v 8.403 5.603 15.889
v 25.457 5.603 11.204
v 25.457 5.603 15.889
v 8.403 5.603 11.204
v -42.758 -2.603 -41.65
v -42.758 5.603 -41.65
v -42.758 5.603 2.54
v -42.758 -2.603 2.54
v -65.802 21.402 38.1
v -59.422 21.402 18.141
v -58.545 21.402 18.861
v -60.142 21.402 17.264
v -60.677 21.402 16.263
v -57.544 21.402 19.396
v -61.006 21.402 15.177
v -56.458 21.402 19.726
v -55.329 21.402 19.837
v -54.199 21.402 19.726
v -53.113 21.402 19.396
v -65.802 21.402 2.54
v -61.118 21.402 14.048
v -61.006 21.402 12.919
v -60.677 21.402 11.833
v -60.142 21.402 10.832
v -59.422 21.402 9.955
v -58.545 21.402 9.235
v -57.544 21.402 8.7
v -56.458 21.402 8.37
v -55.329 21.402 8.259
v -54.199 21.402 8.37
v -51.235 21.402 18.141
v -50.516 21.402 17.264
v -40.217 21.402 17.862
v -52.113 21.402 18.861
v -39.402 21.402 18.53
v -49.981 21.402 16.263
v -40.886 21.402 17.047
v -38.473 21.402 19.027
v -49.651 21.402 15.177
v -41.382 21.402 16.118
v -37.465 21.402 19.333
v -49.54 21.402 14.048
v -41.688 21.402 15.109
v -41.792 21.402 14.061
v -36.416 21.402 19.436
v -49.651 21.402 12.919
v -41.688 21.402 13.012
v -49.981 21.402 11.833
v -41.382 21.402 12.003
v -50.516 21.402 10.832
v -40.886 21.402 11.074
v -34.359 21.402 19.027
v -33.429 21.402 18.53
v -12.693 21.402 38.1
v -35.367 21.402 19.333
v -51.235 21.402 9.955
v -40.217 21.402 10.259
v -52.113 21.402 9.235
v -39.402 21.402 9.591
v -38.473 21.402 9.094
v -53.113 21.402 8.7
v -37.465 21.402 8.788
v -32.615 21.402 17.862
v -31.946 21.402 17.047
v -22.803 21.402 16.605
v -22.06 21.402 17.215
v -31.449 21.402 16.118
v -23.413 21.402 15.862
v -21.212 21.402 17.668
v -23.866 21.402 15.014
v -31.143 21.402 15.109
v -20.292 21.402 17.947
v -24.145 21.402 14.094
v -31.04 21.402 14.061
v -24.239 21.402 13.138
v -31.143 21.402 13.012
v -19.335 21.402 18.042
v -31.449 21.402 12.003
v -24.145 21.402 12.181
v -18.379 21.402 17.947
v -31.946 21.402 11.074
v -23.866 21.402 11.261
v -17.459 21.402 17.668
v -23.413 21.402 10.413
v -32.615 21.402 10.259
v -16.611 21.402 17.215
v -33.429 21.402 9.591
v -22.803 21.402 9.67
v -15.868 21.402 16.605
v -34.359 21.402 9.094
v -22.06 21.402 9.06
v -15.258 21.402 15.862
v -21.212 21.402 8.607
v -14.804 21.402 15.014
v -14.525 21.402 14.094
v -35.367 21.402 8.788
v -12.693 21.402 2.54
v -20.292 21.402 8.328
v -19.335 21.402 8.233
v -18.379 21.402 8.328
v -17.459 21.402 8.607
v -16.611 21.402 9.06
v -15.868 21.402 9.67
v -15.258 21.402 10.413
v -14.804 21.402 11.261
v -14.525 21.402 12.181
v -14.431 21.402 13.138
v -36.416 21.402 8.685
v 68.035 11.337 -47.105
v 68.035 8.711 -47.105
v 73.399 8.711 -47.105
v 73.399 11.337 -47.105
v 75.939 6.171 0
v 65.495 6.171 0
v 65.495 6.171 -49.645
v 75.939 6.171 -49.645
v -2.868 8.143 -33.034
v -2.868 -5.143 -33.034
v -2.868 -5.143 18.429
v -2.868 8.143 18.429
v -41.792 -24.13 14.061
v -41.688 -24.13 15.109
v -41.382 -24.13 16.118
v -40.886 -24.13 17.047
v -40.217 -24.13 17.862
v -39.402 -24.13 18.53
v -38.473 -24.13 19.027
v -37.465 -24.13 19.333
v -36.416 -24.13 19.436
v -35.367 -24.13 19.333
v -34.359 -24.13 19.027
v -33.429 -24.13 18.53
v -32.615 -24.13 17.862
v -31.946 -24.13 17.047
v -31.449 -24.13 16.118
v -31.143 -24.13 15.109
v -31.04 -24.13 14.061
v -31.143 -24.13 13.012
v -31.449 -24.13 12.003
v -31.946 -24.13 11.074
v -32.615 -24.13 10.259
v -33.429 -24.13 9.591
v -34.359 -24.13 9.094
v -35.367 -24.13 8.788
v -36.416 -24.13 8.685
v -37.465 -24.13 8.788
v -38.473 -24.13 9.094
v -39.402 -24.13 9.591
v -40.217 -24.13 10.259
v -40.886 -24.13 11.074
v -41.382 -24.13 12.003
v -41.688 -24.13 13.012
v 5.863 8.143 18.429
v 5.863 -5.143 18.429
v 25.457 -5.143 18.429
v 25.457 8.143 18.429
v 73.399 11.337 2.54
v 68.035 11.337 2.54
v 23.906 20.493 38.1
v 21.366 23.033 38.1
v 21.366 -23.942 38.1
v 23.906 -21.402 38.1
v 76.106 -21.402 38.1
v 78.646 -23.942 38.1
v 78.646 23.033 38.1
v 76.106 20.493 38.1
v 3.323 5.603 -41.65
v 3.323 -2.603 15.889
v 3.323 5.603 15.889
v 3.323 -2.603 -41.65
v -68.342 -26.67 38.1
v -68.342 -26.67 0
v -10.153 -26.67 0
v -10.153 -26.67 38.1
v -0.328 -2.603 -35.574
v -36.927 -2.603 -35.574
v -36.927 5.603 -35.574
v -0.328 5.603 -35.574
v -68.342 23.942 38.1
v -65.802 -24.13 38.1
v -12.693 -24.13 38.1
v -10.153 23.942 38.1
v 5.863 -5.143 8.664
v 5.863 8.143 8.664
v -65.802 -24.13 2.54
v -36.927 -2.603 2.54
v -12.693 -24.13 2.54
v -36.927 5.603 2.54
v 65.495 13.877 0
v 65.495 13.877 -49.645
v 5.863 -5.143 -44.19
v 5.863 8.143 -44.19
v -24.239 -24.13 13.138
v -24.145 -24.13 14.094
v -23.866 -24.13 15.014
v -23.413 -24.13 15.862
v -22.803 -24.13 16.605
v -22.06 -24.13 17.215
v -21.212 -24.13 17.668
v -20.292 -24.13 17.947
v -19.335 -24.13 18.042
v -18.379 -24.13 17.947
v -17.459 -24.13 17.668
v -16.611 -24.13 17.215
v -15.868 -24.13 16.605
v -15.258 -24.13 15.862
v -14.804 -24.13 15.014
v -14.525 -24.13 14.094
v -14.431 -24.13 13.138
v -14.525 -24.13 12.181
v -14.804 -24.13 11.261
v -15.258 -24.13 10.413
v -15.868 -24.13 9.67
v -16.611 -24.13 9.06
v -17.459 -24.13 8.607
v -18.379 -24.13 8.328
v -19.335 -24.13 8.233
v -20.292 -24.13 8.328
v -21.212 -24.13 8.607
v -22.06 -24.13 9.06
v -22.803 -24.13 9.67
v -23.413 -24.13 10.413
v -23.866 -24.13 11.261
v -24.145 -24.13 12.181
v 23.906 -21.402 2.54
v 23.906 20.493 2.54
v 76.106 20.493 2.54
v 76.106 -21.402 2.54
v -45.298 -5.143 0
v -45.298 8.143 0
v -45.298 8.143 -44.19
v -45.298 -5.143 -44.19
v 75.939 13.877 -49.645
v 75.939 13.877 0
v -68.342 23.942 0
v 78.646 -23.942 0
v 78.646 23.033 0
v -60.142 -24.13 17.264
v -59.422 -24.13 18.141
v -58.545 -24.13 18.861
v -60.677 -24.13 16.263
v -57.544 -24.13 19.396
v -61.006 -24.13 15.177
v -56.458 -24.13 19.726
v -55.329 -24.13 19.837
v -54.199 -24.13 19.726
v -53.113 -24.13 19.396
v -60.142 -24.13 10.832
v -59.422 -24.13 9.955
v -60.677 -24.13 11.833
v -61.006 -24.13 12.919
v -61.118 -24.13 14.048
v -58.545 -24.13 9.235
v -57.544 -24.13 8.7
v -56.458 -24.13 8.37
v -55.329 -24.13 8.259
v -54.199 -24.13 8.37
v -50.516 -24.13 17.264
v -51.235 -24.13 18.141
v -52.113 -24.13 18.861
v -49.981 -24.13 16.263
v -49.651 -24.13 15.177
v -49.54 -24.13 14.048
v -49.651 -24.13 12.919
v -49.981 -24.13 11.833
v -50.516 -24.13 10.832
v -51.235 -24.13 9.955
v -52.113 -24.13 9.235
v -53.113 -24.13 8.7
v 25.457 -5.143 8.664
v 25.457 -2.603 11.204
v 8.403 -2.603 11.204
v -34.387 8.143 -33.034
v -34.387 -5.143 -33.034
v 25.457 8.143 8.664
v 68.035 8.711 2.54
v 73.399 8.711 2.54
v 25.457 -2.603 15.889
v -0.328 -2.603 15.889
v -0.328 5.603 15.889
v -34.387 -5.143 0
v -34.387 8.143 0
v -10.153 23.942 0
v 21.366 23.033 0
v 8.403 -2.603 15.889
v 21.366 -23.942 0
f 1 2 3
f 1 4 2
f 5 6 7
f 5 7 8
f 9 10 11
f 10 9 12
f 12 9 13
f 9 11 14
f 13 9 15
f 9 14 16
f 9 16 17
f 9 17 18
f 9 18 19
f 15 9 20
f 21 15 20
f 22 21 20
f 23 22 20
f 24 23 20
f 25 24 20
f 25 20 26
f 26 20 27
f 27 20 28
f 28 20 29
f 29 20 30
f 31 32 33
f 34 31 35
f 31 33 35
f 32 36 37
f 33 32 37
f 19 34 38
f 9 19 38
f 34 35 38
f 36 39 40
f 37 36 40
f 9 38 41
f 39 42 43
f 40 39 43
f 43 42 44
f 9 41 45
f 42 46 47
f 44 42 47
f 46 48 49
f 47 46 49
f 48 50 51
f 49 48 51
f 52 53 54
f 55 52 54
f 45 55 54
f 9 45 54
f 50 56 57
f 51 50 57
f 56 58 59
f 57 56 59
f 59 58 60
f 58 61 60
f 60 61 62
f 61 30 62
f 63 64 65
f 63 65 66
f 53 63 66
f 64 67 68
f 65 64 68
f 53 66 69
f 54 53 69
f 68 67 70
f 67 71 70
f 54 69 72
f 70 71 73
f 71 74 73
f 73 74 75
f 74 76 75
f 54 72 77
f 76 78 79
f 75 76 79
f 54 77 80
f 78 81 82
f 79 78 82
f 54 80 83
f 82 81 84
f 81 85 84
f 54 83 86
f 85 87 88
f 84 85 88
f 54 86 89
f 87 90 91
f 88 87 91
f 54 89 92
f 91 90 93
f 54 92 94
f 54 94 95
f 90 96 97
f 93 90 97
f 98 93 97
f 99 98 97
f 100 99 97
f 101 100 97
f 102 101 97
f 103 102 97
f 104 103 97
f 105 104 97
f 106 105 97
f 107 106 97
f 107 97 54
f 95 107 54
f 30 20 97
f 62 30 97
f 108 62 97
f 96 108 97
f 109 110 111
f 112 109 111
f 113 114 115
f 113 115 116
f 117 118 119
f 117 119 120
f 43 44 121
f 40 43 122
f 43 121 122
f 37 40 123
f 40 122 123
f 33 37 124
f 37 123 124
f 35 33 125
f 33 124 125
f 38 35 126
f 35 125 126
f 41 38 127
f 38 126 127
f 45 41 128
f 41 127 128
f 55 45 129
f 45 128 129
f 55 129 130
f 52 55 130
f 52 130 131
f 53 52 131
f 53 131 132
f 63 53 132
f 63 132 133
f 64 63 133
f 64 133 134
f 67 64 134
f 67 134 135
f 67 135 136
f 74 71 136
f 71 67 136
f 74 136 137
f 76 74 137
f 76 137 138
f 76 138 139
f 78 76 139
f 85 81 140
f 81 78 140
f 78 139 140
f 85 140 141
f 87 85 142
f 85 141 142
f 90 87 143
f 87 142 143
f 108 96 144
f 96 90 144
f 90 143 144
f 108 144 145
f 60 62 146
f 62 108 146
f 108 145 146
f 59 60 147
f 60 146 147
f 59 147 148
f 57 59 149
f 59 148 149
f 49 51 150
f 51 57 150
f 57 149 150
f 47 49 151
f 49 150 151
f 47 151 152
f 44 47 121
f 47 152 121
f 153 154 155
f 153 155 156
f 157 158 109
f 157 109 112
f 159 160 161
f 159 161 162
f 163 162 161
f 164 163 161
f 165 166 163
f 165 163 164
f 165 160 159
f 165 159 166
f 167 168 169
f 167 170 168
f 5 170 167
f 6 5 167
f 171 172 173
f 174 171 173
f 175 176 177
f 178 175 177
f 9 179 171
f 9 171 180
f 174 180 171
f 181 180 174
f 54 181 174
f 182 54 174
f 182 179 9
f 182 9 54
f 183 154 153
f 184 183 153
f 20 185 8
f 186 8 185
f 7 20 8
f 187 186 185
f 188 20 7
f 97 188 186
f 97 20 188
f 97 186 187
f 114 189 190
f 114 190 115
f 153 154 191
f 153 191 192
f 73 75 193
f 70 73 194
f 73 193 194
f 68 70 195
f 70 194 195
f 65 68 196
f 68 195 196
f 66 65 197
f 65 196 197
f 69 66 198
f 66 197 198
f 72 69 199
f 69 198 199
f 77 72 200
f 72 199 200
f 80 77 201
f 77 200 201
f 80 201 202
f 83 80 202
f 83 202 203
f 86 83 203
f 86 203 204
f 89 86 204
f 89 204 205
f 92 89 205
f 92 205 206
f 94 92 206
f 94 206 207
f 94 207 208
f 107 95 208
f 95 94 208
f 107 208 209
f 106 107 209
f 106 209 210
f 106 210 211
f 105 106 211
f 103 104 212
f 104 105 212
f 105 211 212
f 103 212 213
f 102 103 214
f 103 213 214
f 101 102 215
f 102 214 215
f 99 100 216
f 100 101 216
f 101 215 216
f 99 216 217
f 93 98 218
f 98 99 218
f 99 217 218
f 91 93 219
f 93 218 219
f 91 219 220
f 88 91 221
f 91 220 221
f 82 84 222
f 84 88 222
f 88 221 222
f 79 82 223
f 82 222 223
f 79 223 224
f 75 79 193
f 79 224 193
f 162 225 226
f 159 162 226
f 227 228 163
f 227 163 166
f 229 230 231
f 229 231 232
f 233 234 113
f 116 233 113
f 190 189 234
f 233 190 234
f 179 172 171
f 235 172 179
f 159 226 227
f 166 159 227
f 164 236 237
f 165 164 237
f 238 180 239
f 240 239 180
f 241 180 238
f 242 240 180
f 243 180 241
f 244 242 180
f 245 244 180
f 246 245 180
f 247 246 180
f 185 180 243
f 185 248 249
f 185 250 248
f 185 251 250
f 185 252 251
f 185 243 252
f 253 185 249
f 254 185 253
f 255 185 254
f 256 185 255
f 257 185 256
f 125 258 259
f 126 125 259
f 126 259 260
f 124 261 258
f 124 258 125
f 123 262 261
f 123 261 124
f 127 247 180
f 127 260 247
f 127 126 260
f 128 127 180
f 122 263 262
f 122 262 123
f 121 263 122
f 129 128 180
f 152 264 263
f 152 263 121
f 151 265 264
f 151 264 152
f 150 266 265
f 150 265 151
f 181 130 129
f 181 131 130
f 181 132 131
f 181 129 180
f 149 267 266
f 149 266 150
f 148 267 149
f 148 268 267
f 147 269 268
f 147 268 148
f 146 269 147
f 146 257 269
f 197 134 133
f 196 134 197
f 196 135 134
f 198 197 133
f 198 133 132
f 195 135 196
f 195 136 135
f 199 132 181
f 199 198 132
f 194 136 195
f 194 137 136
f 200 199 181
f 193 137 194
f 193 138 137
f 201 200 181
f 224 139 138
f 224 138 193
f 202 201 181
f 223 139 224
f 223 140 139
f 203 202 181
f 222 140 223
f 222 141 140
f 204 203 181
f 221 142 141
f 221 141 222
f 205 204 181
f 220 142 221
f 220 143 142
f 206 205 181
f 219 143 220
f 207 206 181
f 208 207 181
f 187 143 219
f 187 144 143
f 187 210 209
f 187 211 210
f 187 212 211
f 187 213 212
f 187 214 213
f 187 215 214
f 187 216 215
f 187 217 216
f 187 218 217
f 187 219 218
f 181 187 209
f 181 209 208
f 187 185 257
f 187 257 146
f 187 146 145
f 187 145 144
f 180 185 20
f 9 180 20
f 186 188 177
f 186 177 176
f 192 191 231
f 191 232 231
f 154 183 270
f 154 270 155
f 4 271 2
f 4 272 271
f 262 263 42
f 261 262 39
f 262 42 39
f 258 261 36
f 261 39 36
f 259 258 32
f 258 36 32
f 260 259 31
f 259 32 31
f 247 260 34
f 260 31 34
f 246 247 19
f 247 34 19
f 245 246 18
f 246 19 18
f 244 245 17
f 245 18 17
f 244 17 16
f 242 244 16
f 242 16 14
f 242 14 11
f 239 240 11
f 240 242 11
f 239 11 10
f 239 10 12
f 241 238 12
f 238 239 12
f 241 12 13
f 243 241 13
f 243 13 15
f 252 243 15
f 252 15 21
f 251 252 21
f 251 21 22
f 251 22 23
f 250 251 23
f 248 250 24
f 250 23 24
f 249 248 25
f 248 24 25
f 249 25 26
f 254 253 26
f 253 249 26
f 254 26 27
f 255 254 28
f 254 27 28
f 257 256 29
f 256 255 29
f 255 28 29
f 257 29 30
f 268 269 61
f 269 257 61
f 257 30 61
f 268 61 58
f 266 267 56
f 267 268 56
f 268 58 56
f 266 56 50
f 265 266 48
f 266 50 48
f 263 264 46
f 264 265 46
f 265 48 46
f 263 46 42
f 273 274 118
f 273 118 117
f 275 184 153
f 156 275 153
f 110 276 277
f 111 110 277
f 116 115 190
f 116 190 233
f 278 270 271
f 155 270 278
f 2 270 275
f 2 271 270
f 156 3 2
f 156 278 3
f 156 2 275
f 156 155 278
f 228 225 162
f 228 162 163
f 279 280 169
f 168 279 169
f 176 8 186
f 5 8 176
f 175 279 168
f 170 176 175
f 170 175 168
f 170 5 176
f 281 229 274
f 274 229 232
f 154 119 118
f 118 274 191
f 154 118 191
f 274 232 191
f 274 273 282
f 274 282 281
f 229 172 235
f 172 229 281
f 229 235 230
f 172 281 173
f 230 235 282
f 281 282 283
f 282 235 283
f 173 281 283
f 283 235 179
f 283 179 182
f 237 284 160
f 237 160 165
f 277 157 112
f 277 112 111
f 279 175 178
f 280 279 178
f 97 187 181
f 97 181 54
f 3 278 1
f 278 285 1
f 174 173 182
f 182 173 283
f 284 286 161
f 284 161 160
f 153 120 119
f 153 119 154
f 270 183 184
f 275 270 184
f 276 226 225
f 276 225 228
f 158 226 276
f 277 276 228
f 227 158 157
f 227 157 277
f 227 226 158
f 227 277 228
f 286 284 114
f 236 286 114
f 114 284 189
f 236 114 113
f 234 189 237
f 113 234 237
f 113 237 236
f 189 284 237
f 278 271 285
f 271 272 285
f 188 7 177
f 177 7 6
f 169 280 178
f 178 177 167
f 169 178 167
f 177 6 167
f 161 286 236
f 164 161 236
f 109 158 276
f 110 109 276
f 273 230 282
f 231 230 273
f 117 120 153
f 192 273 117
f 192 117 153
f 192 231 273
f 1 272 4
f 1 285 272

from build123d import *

# Parameters (mm, degrees)
F0_W      = 58.1890968606
F0_H      = 50.6123900414
F1_DEPTH  = 38.1
F2_W      = 57.2798922658
F2_H      = 46.9755697995
F3_DEPTH  = 38.1
F5_W      = 10.9104551375
F5_H      = 13.2867023349
F6_DEPTH  = 44.19023
F7_W      = 13.2867023349
F7_H      = 11.1557973206
F8_DEPTH  = 40.25034
F9_W      = 8.7312487776
F9_H      = 13.2867023349
F10_DEPTH = 51.46386
F12_W     = 10.4440525174
F12_H     = 7.7061494812
F13_DEPTH = 49.64546
F14_T     = -2.54
F15_T     = -2.54
F11_W     = 13.2867023349
F11_H     = 9.7652821862
F16_DEPTH = 19.59361
F17_T     = -2.54
F18_R     = 4.9041539646
F19_DEPTH = 46.8809679151
F20_R     = 5.3757066386
F21_DEPTH = 47.4310778081
F22_R     = 5.788816606
F23_DEPTH = 46.9942092896


with BuildPart() as f1:
    # F0 (on Top) → F1 (new body)
    with BuildSketch(Plane.XY):
        with Locations((-39.2473326065, -1.3638064265)):
            Rectangle(F0_W, F0_H)
    extrude(amount=F1_DEPTH)

    # F5 (on face) → F6 (join)
    with BuildSketch(Plane(origin=(0, 0, 0), x_dir=(1, 0, 0), z_dir=(0, 0, -1))):
        with Locations((-39.8426409811, -1.5001110733)):
            Rectangle(F5_W, F5_H)
    extrude(amount=F6_DEPTH)

    # F7 (on face) → F8 (join)
    with BuildSketch(Plane.YZ.offset(-34.3874134123)):
        with Locations((1.5001110733, -38.6123313397)):
            Rectangle(F7_W, F7_H)
    extrude(amount=F8_DEPTH)

    # F9 (on face) → F10 (join)
    with BuildSketch(Plane.XY.offset(-33.0344326794)):
        with Locations((1.4973021989, 1.5001110733)):
            Rectangle(F9_W, F9_H)
    extrude(amount=F10_DEPTH)

    # F14
    f14_openings = [f1.faces().sort_by_distance(p)[0] for p in [
        (-39.247333, -1.363806, 38.1),
    ]]
    offset(amount=F14_T, openings=f14_openings, kind=Kind.INTERSECTION)

    # F18 (on face) → F19 (join)
    with BuildSketch(Plane(origin=(0, -24.1300014472, 0), x_dir=(-1, 0, 0), z_dir=(0, 1, 0))):
        with Locations((19.3353164941, 13.1375342607)):
            Circle(F18_R)
    extrude(amount=F19_DEPTH)

    # F20 (on face) → F21 (join)
    with BuildSketch(Plane(origin=(0, -24.1300014472, 0), x_dir=(-1, 0, 0), z_dir=(0, 1, 0))):
        with Locations((36.4158973098, 14.0606872737)):
            Circle(F20_R)
    extrude(amount=F21_DEPTH)

    # F22 (on face) → F23 (join)
    with BuildSketch(Plane.XZ.offset(-21.4023885942)):
        with Locations((-55.3287565708, 14.0480548143)):
            Circle(F22_R)
    extrude(amount=F23_DEPTH)


with BuildPart() as f3:
    # F2 (on Top) → F3 (new body)
    with BuildSketch(Plane.XY):
        with Locations((50.0062517822, -0.4546036944)):
            Rectangle(F2_W, F2_H)
    extrude(amount=F3_DEPTH)

    # F12 (on face) → F13 (join)
    with BuildSketch(Plane(origin=(0, 0, 0), x_dir=(1, 0, 0), z_dir=(0, 0, -1))):
        with Locations((70.7170628011, -10.0238914602)):
            Rectangle(F12_W, F12_H)
    extrude(amount=F13_DEPTH)

    # F15
    f15_openings = [f3.faces().sort_by_distance(p)[0] for p in [
        (50.006252, -0.454604, 38.1),
    ]]
    offset(amount=F15_T, openings=f15_openings, kind=Kind.INTERSECTION)


with BuildPart() as f16:
    # F11 (on face) → F16 (new body)
    with BuildSketch(Plane.YZ.offset(5.8629265877)):
        with Locations((1.5001110733, 13.5467862275)):
            Rectangle(F11_W, F11_H)
    extrude(amount=F16_DEPTH)

    # F17
    f17_openings = [f16.faces().sort_by_distance(p)[0] for p in [
        (25.456537, 1.500111, 13.546786),
    ]]
    offset(amount=F17_T, openings=f17_openings)


solid = Compound([f1.part, f3.part, f16.part])
